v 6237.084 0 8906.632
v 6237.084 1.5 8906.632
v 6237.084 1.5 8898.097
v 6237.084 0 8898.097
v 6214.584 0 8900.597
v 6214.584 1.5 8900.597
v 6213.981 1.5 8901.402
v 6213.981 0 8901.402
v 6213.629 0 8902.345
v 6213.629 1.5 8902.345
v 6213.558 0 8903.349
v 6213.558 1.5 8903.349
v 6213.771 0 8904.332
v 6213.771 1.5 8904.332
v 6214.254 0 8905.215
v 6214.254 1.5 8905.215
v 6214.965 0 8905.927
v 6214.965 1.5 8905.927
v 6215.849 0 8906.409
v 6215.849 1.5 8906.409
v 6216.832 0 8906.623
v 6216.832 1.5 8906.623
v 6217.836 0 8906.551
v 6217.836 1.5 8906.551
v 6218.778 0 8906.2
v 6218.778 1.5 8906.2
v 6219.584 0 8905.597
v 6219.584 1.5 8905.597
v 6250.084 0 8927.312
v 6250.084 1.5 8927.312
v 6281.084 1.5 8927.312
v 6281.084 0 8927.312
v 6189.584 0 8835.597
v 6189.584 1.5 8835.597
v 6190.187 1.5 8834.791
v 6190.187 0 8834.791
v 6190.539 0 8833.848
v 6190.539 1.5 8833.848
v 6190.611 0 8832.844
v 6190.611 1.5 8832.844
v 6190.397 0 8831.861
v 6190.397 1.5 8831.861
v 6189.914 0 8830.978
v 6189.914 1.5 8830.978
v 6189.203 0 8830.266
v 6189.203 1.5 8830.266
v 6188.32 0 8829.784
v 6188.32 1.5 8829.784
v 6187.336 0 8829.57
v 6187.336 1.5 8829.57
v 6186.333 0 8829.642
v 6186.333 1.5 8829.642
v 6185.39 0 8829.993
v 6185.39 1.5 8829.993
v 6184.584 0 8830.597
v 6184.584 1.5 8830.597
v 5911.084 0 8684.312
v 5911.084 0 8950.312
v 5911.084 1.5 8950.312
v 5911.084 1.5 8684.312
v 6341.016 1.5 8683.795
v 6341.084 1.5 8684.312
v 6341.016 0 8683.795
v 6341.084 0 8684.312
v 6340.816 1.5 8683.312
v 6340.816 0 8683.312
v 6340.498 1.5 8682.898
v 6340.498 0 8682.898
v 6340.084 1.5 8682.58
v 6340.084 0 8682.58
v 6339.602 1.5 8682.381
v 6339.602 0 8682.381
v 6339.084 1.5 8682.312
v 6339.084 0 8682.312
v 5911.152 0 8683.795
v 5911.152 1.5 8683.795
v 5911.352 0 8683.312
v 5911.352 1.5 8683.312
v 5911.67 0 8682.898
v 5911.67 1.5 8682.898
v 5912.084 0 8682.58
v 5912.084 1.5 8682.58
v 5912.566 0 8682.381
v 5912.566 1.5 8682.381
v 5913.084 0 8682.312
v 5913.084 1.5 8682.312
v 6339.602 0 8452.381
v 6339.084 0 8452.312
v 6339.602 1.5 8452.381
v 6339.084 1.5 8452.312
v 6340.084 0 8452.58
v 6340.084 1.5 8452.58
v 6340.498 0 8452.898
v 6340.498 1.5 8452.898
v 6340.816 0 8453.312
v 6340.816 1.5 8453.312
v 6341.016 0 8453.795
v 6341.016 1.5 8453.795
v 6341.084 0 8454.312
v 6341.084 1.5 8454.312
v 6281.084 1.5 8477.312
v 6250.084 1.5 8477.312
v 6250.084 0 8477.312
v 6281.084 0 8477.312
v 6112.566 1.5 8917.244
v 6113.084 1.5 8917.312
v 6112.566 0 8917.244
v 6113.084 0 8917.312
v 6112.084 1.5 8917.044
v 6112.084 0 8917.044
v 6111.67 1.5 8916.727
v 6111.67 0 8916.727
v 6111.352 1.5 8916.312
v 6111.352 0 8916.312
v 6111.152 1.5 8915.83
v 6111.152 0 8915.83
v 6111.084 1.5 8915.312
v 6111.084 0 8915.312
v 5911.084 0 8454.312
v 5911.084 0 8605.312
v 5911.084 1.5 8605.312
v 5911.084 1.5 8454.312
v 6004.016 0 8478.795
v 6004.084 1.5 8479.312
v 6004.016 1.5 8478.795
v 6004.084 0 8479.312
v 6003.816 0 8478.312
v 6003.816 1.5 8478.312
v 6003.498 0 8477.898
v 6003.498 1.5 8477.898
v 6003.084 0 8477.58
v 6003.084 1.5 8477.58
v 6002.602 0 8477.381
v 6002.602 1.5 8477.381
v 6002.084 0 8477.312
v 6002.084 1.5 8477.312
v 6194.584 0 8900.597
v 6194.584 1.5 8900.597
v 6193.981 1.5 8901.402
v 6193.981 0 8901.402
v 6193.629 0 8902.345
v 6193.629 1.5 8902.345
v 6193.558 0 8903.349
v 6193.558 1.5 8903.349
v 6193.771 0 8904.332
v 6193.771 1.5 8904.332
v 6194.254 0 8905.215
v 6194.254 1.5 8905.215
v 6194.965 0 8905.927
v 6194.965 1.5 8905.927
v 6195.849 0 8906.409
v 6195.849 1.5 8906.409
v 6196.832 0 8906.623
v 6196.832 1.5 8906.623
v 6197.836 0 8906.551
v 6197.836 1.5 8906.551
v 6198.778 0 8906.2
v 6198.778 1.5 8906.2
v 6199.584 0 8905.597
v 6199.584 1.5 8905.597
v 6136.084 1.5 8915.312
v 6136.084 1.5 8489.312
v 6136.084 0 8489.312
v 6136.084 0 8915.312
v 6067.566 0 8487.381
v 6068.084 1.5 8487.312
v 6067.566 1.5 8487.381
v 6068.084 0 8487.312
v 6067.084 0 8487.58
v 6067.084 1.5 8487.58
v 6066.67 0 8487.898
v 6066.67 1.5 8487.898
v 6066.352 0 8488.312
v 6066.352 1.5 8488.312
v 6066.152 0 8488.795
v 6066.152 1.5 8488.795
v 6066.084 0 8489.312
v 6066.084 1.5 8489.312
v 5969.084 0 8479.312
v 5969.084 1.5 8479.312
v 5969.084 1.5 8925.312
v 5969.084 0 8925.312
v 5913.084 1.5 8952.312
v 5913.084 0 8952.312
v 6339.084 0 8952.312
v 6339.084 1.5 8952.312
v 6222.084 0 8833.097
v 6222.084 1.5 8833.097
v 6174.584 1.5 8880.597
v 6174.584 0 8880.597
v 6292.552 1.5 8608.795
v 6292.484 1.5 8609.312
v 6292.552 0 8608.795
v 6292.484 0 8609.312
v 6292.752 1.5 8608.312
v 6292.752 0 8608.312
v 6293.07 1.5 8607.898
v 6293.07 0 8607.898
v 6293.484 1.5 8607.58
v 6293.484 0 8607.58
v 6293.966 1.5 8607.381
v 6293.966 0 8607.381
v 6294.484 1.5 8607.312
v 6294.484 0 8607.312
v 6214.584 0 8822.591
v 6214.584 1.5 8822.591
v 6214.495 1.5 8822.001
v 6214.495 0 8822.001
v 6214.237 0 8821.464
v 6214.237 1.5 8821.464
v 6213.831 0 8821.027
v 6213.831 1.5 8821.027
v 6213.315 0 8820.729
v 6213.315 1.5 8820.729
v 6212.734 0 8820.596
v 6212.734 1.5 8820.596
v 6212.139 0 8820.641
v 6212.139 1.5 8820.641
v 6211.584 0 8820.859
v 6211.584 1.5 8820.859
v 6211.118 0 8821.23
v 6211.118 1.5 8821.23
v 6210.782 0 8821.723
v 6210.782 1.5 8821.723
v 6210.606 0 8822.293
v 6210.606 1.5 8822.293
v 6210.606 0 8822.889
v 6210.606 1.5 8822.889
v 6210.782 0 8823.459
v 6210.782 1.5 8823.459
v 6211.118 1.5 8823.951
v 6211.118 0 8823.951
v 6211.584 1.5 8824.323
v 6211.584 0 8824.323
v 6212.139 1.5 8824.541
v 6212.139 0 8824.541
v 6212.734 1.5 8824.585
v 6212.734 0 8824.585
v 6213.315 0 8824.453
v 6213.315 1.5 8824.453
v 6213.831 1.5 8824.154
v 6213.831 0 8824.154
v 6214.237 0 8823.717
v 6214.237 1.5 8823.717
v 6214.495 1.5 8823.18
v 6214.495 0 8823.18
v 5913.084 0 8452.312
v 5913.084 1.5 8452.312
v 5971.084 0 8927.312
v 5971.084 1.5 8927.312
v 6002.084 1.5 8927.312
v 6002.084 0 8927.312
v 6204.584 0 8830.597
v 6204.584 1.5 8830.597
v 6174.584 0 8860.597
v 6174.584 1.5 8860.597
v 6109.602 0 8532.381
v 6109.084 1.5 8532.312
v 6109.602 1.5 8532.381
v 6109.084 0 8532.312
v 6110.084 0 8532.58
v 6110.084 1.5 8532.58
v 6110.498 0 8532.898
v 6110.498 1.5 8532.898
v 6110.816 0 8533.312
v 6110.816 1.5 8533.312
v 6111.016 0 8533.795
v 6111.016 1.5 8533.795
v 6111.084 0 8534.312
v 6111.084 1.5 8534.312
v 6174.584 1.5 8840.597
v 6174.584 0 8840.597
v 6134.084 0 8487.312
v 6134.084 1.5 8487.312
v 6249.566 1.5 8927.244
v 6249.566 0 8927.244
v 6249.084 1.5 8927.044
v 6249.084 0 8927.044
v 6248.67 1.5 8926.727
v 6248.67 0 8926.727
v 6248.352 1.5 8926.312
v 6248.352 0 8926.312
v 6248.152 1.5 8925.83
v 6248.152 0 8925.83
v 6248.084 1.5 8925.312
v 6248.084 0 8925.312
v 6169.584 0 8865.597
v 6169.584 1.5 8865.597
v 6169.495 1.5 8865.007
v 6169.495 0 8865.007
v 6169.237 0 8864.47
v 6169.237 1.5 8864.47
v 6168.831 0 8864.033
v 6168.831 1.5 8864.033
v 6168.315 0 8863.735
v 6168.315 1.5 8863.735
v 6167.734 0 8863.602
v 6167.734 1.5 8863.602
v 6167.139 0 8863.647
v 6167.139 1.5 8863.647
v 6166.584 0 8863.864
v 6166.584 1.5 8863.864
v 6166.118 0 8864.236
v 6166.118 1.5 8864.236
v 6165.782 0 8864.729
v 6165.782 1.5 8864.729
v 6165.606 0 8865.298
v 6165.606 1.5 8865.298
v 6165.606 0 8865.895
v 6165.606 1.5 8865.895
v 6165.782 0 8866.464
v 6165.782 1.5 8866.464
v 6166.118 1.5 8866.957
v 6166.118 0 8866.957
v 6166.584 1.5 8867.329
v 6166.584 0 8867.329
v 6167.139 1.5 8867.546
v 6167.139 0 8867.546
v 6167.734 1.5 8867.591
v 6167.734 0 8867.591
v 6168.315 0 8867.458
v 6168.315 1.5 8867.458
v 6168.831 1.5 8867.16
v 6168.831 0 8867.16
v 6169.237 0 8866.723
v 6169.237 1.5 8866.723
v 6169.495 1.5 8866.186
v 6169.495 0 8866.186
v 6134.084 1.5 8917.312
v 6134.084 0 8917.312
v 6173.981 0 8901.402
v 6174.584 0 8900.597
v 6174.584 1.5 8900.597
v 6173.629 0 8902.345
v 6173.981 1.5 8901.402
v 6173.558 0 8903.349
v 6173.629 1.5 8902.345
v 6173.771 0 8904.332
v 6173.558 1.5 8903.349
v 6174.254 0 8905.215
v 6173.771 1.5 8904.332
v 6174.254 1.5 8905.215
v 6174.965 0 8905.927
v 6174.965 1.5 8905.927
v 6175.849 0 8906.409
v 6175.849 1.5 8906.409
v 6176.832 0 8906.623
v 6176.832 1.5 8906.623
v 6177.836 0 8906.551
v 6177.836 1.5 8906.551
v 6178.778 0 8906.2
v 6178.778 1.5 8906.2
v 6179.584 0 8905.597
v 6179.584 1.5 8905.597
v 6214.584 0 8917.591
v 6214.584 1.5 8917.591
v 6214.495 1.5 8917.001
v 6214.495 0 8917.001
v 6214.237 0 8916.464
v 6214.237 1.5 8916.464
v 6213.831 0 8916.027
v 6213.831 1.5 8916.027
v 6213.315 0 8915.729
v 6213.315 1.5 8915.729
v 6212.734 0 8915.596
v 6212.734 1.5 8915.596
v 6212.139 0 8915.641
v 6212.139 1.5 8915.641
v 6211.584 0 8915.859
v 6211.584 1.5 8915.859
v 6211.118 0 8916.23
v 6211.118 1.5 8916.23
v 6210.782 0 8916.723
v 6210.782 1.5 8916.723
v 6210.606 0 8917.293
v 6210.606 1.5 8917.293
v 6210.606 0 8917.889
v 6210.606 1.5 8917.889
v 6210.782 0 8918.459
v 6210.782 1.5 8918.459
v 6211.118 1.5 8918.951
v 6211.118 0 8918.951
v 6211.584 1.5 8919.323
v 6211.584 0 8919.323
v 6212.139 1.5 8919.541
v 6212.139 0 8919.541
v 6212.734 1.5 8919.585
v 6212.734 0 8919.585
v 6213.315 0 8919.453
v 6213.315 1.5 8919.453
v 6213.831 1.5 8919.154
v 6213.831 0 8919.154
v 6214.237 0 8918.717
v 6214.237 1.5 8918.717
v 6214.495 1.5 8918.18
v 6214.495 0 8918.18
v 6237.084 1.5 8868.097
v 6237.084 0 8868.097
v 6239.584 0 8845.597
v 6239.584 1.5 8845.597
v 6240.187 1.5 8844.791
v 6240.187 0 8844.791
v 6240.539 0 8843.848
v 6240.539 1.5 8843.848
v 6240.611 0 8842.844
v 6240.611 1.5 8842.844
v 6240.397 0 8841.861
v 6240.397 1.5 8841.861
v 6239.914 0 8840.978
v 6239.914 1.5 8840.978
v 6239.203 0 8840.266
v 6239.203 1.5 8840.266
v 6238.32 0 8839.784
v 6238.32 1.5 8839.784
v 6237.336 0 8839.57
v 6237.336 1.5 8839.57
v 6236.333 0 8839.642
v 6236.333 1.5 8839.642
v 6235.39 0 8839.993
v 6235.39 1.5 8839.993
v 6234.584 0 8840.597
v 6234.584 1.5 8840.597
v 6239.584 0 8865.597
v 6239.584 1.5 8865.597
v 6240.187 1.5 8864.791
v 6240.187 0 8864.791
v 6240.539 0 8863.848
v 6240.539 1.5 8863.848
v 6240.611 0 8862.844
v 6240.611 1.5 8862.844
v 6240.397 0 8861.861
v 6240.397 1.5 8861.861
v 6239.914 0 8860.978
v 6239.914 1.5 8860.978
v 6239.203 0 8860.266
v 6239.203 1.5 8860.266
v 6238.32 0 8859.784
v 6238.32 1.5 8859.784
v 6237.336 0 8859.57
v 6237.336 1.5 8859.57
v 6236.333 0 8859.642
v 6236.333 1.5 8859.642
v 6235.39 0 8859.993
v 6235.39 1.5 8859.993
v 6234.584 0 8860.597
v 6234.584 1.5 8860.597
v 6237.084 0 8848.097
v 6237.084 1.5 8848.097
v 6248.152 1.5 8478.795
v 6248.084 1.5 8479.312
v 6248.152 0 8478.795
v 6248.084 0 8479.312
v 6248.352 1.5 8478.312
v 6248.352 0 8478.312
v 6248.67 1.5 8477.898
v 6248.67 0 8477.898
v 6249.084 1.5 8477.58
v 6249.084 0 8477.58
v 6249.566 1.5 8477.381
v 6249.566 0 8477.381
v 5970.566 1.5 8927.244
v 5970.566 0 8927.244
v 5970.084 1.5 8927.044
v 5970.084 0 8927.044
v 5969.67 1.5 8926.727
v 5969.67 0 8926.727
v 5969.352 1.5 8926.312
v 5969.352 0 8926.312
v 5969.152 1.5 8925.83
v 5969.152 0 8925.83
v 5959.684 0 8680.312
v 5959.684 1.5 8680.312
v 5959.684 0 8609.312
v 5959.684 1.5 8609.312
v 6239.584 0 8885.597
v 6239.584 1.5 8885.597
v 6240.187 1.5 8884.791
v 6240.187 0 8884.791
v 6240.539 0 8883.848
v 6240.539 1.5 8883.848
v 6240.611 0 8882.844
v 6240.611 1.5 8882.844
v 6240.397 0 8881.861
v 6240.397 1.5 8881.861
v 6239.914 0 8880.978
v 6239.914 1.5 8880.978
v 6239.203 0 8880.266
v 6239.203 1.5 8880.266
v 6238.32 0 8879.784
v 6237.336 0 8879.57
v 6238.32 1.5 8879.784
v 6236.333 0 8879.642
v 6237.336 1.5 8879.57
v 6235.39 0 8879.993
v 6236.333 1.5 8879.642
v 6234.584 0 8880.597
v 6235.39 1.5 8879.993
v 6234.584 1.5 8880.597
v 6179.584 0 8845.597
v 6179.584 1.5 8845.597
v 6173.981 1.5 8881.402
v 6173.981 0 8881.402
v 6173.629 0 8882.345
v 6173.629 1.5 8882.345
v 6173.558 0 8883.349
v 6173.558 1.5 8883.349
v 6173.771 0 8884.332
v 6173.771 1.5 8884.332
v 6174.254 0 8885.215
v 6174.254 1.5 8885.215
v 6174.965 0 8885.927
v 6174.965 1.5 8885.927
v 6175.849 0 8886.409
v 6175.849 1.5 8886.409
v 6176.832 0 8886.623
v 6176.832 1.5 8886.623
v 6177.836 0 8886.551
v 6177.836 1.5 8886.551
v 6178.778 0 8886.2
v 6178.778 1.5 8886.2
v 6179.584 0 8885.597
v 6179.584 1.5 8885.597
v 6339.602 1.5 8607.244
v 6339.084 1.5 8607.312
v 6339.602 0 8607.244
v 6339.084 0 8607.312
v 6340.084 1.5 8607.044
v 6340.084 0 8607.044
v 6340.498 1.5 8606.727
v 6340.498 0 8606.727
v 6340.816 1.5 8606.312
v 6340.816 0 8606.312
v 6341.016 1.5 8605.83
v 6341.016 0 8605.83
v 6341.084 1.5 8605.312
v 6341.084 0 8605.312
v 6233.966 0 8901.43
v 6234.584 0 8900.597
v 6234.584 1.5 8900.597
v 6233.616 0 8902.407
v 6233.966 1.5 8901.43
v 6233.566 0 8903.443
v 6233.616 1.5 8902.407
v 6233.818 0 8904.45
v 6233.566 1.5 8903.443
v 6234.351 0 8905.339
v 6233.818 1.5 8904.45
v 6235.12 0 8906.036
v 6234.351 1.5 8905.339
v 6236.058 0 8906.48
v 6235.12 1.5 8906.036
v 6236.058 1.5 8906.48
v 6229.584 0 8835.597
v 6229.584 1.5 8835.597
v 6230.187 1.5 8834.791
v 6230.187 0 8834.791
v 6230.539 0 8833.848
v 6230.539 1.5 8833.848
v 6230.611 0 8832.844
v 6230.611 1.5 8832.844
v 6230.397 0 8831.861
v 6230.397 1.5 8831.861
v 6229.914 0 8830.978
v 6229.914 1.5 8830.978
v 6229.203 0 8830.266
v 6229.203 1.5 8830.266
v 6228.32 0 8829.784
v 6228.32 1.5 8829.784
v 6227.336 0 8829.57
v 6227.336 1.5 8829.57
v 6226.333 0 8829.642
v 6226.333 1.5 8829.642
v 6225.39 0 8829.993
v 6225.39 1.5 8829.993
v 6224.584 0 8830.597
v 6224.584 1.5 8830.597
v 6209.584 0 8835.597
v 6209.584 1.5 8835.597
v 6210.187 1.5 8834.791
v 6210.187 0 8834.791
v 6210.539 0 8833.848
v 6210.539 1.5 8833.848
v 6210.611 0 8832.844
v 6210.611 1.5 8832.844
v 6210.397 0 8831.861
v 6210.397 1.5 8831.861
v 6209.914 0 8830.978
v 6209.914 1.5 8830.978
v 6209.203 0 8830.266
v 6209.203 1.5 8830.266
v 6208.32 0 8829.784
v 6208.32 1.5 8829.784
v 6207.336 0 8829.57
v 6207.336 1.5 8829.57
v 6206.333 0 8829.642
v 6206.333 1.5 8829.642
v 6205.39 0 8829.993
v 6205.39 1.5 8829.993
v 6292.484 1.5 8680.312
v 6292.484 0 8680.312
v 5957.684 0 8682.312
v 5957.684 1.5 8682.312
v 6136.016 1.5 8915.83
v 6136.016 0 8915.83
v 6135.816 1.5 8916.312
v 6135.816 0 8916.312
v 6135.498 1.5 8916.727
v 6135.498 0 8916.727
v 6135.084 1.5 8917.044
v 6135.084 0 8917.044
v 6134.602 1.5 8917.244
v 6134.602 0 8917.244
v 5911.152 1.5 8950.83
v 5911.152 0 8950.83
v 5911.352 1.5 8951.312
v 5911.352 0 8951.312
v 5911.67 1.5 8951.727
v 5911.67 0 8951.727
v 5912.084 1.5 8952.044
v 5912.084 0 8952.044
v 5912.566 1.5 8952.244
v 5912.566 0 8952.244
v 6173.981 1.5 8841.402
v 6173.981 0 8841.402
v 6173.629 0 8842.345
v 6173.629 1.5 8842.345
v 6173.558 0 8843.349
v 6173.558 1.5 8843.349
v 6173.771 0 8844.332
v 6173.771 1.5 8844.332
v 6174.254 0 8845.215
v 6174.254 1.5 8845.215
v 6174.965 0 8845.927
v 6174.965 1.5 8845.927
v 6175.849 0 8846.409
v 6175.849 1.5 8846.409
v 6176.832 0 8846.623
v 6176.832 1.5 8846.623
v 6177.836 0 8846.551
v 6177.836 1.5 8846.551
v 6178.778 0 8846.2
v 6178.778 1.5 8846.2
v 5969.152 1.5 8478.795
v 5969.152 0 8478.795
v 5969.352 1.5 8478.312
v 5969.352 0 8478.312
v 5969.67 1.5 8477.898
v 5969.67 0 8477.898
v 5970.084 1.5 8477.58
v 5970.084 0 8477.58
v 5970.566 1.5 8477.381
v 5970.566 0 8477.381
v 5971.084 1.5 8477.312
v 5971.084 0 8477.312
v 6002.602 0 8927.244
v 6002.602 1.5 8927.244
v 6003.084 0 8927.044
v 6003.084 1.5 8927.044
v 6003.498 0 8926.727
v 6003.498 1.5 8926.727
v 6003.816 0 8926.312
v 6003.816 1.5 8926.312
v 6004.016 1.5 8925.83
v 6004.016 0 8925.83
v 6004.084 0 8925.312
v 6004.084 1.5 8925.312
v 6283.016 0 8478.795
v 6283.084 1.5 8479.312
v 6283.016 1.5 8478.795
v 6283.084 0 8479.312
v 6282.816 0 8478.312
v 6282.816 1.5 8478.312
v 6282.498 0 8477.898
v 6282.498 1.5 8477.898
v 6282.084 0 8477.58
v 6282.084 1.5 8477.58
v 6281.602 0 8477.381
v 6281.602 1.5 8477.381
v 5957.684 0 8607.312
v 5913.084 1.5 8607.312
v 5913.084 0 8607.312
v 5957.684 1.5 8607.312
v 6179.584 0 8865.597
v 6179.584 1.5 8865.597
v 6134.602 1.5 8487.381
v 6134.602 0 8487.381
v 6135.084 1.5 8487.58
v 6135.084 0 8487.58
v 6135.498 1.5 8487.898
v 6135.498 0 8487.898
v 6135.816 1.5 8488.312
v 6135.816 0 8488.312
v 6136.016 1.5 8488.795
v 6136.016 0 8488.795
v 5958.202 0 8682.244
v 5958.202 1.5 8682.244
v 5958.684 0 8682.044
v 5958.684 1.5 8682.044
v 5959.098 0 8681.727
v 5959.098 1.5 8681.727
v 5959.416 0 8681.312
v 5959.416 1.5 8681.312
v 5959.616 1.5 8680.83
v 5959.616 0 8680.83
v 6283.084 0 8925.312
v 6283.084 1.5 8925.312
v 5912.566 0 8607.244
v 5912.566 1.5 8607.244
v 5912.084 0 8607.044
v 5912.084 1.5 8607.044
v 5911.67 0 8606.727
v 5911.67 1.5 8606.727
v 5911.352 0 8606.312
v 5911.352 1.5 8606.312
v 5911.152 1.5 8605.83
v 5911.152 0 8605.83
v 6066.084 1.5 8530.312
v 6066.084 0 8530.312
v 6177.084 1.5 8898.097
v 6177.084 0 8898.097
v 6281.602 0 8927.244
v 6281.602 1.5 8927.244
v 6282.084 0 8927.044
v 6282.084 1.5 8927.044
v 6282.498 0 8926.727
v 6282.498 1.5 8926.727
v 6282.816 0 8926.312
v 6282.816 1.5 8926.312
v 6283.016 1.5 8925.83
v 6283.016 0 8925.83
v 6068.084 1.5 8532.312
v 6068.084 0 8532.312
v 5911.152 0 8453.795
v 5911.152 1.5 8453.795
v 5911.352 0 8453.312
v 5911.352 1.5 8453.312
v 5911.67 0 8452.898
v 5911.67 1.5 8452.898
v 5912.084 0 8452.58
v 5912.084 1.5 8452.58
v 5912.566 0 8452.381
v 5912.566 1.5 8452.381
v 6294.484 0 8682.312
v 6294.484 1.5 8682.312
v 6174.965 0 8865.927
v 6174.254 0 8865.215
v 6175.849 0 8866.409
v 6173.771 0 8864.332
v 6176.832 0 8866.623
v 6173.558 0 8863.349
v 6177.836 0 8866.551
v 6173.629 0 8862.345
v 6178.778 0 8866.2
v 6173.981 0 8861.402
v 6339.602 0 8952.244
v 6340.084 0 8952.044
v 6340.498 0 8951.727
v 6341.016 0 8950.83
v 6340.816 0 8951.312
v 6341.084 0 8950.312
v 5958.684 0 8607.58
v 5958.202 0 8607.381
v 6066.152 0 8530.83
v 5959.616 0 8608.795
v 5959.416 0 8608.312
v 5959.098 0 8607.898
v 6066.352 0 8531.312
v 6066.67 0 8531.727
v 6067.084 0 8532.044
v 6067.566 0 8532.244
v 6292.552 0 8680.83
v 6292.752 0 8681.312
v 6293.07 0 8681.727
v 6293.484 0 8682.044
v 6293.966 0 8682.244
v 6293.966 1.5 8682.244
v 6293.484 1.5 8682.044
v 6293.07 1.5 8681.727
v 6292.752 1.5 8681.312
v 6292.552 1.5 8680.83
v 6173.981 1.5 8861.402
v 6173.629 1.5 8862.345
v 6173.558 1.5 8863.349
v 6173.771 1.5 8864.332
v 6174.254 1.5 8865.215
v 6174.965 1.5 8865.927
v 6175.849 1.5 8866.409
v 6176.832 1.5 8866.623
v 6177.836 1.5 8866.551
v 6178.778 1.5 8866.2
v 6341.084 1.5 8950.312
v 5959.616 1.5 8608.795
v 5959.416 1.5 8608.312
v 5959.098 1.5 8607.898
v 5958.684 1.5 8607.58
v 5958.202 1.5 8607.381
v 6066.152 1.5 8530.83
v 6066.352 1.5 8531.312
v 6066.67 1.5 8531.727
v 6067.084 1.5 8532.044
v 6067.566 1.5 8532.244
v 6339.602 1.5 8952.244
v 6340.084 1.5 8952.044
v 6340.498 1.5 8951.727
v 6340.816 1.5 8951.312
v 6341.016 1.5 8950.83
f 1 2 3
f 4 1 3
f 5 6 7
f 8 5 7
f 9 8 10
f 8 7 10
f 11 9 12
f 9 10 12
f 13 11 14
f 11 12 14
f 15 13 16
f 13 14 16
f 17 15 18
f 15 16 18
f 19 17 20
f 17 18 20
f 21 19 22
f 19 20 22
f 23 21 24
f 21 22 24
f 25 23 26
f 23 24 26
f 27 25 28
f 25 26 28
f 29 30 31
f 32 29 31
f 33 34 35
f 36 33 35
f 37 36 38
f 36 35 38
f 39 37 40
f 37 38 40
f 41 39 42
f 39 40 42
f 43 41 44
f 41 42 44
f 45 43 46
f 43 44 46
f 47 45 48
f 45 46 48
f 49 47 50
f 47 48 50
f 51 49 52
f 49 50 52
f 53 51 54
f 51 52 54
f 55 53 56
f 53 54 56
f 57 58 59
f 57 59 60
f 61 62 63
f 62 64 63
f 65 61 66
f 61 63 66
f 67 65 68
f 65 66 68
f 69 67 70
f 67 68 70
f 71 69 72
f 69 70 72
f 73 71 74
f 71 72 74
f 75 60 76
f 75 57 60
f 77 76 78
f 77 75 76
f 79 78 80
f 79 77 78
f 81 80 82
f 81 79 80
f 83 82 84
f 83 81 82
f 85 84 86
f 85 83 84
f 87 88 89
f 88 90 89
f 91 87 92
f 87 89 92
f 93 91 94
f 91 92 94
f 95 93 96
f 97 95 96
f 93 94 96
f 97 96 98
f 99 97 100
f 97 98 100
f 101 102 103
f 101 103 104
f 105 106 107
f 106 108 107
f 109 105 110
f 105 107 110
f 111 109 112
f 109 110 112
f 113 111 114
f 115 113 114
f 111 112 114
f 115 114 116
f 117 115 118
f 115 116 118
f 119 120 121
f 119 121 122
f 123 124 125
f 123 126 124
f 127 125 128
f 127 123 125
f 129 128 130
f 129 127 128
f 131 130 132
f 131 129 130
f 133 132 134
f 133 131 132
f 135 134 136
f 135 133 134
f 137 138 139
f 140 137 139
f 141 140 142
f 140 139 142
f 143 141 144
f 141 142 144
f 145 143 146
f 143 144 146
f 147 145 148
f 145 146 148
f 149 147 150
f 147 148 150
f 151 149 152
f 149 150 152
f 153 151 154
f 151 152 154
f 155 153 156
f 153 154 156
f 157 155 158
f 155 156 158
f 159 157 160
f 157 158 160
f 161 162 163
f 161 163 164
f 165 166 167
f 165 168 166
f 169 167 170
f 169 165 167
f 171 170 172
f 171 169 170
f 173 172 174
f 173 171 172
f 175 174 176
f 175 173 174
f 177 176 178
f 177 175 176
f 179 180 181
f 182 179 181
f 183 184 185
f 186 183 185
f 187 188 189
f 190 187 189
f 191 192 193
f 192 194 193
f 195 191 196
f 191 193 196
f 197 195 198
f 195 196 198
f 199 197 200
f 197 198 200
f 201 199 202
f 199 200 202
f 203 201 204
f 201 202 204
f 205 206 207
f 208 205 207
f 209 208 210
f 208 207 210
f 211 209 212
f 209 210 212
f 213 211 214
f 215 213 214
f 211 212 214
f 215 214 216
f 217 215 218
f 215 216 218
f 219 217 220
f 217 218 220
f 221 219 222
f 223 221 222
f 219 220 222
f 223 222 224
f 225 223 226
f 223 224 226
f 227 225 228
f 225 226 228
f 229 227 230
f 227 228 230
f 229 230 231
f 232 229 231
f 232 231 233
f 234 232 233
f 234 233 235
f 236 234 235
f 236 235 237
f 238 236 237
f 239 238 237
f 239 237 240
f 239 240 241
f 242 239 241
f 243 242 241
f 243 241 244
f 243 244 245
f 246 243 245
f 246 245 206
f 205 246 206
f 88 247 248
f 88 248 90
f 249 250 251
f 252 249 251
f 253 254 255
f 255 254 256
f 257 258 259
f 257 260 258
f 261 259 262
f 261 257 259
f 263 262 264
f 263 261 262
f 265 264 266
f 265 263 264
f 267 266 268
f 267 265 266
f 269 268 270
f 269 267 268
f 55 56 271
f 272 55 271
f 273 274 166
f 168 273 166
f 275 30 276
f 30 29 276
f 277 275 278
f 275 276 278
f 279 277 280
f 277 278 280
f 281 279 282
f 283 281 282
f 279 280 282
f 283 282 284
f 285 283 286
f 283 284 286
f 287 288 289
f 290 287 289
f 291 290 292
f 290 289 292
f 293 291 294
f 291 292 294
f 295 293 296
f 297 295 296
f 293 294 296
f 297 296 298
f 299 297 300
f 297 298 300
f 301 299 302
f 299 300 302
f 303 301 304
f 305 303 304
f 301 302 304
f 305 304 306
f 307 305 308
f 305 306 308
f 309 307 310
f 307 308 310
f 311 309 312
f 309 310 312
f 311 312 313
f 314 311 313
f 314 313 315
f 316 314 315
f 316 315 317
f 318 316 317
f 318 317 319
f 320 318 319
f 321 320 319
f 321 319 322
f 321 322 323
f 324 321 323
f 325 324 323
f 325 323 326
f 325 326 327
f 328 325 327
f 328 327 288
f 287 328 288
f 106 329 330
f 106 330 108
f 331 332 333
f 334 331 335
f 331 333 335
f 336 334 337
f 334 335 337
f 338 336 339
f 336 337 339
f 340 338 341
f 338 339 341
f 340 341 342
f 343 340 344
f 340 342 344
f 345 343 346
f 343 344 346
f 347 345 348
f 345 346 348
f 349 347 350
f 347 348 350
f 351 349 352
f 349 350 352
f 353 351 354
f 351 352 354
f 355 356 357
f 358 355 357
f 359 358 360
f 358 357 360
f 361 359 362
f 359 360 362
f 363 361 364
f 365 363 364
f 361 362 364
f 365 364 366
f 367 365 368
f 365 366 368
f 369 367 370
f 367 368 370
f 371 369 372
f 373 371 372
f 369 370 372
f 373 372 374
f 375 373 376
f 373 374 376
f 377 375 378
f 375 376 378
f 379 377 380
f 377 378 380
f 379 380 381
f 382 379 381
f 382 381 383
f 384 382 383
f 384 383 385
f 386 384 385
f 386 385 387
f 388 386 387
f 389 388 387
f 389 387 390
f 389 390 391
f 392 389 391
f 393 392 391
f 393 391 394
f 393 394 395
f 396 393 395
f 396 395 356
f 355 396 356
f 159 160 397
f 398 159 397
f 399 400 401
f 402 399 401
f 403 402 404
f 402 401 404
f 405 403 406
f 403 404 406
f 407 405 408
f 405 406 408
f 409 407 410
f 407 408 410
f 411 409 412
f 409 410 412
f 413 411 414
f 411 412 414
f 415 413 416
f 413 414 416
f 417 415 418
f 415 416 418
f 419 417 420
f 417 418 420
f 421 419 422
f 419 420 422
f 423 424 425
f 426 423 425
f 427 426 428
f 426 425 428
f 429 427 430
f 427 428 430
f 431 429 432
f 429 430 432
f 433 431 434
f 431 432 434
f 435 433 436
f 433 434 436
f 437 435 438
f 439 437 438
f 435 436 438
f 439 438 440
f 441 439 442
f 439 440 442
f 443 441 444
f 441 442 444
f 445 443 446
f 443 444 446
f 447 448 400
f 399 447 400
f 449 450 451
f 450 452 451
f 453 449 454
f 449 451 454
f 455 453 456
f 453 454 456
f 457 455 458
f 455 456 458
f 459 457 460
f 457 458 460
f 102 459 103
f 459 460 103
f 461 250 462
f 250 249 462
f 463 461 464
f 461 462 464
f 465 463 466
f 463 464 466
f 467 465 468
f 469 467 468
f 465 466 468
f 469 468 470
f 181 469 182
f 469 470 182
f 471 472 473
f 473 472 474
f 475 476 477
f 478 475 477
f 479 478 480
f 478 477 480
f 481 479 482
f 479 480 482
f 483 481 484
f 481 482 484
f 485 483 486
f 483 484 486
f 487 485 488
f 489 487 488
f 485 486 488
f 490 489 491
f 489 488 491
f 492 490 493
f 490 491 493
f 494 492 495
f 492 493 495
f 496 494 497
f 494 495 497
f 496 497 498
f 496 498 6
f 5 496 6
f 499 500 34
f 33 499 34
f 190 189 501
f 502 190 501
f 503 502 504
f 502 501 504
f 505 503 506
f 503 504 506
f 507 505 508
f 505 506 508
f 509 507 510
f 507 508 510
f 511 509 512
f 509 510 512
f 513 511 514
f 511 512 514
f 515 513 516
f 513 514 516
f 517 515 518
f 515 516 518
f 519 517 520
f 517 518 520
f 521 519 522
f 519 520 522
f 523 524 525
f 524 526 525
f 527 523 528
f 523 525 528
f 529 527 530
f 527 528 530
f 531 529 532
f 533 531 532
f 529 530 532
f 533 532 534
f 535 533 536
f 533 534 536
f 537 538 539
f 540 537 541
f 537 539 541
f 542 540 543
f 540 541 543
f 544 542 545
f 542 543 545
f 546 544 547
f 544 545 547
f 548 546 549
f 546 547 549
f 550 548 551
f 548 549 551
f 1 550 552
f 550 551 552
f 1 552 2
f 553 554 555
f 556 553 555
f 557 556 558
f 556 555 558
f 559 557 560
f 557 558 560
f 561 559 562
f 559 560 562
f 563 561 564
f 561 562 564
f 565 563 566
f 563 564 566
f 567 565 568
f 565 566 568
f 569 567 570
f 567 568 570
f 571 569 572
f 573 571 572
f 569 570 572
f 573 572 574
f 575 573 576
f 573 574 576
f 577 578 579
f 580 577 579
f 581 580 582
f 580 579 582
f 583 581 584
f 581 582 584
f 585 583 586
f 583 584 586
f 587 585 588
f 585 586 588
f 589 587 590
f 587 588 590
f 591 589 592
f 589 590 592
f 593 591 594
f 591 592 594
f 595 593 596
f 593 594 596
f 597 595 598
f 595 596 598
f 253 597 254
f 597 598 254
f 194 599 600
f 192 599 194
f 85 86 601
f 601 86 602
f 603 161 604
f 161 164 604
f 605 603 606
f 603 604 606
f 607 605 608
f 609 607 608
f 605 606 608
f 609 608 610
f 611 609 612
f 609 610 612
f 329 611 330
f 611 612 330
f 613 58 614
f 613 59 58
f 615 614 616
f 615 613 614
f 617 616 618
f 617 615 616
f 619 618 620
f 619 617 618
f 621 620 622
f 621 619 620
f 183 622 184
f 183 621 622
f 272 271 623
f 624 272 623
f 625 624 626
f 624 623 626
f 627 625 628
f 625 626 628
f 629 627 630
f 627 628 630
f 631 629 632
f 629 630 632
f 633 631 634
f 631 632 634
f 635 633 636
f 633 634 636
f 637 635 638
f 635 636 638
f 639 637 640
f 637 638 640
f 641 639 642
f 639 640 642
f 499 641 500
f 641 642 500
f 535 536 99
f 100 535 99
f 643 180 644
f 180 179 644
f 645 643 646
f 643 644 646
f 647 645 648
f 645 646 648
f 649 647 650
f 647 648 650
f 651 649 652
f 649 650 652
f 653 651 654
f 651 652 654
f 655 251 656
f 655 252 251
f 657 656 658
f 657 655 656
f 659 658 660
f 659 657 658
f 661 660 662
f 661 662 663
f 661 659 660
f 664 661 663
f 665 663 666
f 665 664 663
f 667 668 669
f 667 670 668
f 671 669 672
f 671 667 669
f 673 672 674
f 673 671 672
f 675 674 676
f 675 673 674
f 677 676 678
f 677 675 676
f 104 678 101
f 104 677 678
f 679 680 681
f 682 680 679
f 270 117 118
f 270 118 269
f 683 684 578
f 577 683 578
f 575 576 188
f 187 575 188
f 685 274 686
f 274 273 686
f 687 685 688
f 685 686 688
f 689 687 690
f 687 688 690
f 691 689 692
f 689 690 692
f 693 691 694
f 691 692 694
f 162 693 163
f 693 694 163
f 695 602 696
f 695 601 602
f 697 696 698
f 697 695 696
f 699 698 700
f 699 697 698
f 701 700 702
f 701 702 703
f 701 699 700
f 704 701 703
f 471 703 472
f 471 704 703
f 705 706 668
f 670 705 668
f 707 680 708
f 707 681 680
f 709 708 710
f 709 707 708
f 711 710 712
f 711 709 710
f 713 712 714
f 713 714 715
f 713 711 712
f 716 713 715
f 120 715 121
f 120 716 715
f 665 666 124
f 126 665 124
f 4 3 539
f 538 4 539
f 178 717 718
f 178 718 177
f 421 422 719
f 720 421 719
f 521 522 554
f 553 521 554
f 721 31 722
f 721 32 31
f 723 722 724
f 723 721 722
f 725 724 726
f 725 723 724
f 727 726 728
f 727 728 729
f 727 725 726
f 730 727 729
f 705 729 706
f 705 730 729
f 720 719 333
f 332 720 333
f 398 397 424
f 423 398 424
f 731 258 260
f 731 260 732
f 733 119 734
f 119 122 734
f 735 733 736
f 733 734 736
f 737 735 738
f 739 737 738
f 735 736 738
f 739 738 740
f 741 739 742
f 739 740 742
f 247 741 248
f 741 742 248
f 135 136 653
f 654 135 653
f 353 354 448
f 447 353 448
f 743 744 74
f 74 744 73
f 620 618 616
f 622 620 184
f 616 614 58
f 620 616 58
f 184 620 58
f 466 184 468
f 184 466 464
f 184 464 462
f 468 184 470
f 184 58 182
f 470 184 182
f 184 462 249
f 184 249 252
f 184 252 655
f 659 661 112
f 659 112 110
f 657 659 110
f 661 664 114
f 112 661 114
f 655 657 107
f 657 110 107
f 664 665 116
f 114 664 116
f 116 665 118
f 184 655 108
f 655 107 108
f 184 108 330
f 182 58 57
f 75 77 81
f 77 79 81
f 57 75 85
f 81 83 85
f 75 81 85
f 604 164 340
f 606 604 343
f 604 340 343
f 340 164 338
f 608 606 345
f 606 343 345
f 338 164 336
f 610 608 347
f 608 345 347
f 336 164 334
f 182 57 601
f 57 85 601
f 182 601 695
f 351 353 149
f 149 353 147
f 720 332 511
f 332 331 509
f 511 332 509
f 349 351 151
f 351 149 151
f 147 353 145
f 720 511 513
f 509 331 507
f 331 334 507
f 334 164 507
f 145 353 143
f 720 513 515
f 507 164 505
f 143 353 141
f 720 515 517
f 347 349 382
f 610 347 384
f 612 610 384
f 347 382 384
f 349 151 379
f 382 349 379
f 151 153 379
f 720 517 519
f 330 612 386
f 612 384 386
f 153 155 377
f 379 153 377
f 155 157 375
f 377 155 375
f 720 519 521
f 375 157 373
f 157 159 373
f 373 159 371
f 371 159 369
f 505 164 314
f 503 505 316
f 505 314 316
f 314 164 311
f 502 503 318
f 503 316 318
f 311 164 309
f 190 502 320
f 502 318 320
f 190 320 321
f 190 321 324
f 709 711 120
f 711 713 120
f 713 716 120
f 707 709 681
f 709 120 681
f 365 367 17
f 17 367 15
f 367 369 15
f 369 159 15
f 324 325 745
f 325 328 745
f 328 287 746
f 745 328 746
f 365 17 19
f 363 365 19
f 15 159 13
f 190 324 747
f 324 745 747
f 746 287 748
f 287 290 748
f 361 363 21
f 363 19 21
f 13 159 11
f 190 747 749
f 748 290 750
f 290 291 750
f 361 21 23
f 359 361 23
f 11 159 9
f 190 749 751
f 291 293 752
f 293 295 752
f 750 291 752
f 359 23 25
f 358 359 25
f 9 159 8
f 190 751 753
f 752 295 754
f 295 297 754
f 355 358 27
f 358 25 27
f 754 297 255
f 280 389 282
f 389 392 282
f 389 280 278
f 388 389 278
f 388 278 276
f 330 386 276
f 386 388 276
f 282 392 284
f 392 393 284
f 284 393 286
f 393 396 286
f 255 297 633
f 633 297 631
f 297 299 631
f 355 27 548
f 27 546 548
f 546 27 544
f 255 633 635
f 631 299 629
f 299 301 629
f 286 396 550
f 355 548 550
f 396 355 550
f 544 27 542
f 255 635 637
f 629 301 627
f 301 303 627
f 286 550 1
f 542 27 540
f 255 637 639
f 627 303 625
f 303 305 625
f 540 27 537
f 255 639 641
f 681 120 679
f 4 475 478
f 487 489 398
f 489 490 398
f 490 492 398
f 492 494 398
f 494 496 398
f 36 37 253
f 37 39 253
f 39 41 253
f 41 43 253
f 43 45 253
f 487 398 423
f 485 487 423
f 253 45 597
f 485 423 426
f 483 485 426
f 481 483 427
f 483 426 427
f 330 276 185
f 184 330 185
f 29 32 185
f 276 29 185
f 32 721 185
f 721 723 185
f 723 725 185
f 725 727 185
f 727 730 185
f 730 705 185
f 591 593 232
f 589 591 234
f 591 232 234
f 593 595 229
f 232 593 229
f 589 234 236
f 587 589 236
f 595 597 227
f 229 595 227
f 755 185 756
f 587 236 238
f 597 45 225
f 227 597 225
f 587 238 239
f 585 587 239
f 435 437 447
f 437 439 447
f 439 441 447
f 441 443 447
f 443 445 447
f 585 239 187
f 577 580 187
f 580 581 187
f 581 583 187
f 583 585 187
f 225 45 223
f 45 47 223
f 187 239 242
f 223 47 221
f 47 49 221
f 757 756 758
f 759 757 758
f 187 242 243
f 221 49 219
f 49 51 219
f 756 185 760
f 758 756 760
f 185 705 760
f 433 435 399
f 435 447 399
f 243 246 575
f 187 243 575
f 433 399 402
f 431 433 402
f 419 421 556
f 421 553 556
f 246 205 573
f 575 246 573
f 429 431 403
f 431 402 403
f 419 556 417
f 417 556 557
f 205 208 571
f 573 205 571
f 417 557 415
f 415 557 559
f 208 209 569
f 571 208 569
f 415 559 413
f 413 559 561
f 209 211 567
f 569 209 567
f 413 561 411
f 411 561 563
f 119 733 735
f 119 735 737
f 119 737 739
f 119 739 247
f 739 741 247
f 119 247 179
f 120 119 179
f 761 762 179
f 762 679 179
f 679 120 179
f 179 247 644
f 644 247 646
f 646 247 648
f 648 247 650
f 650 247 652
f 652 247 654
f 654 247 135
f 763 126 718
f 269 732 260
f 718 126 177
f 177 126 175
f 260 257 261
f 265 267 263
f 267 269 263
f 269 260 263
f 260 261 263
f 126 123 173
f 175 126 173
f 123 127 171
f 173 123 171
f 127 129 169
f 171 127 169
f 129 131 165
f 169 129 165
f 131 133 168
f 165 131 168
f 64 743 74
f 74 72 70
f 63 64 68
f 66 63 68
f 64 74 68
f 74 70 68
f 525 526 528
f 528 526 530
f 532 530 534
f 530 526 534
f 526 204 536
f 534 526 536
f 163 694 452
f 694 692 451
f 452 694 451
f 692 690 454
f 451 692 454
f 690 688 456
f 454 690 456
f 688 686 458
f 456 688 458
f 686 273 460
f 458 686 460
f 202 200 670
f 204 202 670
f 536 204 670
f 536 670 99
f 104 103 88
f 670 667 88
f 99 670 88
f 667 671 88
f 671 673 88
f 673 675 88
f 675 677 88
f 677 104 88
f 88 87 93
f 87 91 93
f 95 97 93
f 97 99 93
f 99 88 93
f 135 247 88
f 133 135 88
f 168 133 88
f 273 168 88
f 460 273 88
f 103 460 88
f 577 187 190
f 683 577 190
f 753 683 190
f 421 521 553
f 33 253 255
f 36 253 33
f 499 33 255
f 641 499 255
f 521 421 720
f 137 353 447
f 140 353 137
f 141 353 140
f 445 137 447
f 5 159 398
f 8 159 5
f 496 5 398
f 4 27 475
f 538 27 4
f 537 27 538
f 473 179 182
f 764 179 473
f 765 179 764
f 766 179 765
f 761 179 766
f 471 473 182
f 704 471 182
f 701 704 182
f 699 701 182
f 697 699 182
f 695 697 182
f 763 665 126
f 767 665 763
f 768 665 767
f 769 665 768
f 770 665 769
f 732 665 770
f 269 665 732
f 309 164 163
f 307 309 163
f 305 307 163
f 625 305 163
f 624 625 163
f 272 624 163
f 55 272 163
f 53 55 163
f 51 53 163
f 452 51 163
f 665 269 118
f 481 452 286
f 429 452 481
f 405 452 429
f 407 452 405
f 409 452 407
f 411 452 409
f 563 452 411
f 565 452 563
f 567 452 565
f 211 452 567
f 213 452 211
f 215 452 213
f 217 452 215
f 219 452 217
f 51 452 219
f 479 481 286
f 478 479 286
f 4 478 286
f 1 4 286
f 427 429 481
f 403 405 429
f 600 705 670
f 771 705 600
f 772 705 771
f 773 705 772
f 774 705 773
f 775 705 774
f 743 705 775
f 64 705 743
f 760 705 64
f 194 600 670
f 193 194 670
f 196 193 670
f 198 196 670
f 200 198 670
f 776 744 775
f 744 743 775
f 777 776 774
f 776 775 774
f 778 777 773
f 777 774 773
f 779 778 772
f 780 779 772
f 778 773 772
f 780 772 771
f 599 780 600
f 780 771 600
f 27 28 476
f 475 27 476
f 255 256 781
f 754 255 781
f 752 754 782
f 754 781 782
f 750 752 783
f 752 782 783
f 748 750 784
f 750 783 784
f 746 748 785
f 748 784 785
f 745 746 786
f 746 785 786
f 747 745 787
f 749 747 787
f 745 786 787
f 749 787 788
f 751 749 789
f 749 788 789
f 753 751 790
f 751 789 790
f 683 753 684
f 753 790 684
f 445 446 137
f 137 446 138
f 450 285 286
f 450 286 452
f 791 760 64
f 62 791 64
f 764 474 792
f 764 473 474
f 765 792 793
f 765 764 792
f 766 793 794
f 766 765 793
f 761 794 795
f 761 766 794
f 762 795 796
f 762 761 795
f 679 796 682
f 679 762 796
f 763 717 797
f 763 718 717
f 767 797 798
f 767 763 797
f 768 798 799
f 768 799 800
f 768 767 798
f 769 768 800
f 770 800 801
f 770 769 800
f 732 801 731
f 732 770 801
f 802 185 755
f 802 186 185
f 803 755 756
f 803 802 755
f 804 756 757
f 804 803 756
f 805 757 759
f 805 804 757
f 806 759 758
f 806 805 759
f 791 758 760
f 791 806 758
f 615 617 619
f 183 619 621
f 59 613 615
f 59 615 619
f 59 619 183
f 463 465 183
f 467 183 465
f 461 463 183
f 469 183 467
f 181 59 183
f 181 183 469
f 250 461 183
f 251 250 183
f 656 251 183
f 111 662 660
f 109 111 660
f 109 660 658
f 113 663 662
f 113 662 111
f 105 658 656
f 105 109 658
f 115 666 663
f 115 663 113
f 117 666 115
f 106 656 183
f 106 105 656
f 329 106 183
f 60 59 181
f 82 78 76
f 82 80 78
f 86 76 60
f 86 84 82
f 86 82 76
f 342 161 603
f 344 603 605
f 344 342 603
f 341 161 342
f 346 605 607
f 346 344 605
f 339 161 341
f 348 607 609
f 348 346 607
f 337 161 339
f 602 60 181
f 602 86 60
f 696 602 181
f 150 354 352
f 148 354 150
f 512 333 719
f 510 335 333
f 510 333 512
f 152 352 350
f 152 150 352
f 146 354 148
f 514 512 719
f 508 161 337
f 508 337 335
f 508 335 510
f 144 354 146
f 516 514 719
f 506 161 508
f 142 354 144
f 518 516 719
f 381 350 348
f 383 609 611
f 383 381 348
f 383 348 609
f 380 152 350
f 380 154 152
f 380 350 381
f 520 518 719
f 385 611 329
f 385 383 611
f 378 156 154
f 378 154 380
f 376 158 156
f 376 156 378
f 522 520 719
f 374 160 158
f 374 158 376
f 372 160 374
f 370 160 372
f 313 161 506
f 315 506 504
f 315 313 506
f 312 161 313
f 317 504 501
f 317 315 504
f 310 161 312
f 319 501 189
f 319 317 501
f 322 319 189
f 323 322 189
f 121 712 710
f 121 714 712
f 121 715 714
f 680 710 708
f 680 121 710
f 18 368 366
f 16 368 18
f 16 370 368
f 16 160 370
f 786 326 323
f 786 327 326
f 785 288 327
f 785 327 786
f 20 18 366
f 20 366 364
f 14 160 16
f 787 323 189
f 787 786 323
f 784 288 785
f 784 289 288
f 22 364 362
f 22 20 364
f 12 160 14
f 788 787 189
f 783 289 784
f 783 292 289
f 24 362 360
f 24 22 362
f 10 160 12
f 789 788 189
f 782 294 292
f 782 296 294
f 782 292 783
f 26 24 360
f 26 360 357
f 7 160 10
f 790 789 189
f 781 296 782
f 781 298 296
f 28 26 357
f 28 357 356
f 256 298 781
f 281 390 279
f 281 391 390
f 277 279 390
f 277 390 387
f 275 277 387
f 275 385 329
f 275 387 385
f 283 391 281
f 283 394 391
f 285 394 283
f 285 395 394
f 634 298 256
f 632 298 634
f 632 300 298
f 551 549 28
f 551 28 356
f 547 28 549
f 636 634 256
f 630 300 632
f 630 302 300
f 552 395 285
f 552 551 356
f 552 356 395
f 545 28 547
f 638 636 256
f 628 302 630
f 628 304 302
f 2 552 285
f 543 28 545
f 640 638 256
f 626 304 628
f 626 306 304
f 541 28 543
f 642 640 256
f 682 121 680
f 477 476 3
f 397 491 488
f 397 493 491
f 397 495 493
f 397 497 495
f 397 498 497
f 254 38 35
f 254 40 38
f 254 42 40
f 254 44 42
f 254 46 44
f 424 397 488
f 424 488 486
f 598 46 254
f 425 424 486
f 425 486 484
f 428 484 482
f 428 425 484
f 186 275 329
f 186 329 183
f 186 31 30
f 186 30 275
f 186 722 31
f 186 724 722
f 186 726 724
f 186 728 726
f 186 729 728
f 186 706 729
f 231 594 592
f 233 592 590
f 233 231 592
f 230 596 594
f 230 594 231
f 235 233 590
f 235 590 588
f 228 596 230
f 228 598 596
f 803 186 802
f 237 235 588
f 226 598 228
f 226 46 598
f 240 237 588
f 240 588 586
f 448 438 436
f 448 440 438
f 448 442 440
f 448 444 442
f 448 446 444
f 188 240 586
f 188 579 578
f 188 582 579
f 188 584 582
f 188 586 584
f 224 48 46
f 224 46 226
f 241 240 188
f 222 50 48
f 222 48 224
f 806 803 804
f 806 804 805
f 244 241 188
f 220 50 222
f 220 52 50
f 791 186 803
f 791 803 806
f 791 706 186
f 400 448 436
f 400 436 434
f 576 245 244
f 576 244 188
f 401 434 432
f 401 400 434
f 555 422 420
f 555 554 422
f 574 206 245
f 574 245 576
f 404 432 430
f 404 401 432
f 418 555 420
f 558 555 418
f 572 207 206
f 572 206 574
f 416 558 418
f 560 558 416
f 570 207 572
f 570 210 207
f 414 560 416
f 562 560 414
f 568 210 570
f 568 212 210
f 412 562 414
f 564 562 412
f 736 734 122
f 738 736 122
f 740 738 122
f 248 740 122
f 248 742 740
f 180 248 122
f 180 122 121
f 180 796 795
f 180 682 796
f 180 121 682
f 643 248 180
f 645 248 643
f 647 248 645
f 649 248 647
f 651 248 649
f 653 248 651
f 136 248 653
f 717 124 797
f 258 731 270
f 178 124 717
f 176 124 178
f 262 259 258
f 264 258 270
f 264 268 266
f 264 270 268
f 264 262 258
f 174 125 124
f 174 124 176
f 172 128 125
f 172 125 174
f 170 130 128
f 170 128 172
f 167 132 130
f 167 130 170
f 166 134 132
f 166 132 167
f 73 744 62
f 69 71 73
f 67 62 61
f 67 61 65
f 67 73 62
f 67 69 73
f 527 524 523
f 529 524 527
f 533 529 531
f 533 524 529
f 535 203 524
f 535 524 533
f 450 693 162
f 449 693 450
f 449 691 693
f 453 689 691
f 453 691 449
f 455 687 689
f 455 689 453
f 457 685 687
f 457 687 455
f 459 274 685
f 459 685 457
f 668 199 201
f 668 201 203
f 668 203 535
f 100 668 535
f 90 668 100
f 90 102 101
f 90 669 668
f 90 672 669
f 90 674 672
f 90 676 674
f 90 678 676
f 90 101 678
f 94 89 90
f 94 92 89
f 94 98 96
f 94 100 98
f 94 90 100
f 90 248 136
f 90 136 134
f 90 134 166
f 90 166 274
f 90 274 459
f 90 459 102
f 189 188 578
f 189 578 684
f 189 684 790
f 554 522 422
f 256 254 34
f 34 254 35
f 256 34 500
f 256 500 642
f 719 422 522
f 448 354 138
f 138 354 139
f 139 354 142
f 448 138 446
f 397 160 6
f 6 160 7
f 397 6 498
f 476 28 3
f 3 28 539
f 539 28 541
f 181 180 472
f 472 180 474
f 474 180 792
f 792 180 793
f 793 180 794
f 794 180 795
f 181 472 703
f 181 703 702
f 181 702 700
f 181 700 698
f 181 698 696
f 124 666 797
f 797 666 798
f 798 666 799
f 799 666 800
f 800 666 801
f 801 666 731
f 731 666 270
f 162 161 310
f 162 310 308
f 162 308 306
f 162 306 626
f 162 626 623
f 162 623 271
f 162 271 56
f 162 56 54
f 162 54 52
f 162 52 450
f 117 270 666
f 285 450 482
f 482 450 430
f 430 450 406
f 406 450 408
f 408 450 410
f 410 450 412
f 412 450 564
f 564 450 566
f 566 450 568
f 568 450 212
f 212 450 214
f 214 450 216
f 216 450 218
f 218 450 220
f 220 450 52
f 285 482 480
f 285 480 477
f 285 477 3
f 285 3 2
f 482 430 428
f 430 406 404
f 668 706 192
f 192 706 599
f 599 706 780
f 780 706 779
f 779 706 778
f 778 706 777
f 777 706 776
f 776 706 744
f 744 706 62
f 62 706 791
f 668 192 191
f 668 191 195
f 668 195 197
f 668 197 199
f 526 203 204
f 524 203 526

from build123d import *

# Parameters (mm, degrees)
SKETCH1_W           = 430
SKETCH1_H           = 500
BOSS_EXTRUDE1_DEPTH = 1.5
SKETCH2_W           = 48.6
SKETCH2_H           = 75
CUT_EXTRUDE1_DEPTH  = 10
SKETCH3_W           = 35
SKETCH3_H           = 450
CUT_EXTRUDE2_DEPTH  = 10
CUT_EXTRUDE3_DEPTH  = 10
FILLET2_R           = 2
FILLET3_R           = 2
SKETCH6_R           = 2
CUT_EXTRUDE4_DEPTH  = 10


with BuildPart() as part:
    # Sketch1 → Boss-Extrude1 (new body)
    with BuildSketch(Plane(origin=(0, 0, 0), x_dir=(1, 0, 0), z_dir=(0, 1, 0))):
        with Locations((6126.084066999, -8702.312377786)):
            Rectangle(SKETCH1_W, SKETCH1_H)
    extrude(amount=BOSS_EXTRUDE1_DEPTH)

    # Sketch2 → Cut-Extrude1 (cut)
    with BuildSketch(Plane(origin=(0, 1.5, 0), x_dir=(1, 0, 0), z_dir=(0, 1, 0))):
        with Locations((5935.384066999, -8644.812377786)):
            Rectangle(SKETCH2_W, SKETCH2_H)
        with Locations((6316.784066999, -8644.812377786)):
            Rectangle(SKETCH2_W, SKETCH2_H)
    extrude(amount=-CUT_EXTRUDE1_DEPTH, mode=Mode.SUBTRACT)

    # Sketch3 → Cut-Extrude2 (cut)
    with BuildSketch(Plane(origin=(0, 1.5, 0), x_dir=(1, 0, 0), z_dir=(0, 1, 0))):
        Polygon((5969.084066999, -8541.651929061), (5969.084066999, -8927.312377786), (6004.084066999, -8927.312377786), (6004.084066999, -8477.312377786), (5969.084066999, -8477.312377786), align=None)
        with Locations((6265.584066999, -8702.312377786)):
            Rectangle(SKETCH3_W, SKETCH3_H)
        Polygon((6102.084066999, -8487.312377786), (6136.084066999, -8487.312377786), (6136.084066999, -8917.312377786), (6111.084066999, -8917.312377786), (6111.084066999, -8532.312377786), (6066.084066999, -8532.312377786), (6066.084066999, -8487.312377786), align=None)
    extrude(amount=-CUT_EXTRUDE2_DEPTH, mode=Mode.SUBTRACT)

    # Sketch4 → Cut-Extrude3 (cut)
    with BuildSketch(Plane(origin=(0, 1.5, 0), x_dir=(1, 0, 0), z_dir=(0, 1, 0))):
        with BuildLine():
            Line((6234.584067167, -8840.596520357), (6177.084066999, -8898.096518708))
            Line((6177.084066999, -8898.096518708), (6174.584066999, -8900.596520951))
            ThreePointArc((6174.584066999, -8900.596520951), (6174.584069168, -8905.596518633), (6179.584066849, -8905.596518637))
            Line((6179.584066849, -8905.596518637), (6237.084067092, -8848.09652021))
            Line((6237.084067092, -8848.09652021), (6239.584067017, -8845.596520364))
            ThreePointArc((6239.584067017, -8845.596520364), (6239.584067096, -8840.596520436), (6234.584067167, -8840.596520357))
        make_face()
        with BuildLine():
            ThreePointArc((6174.584067387, -8880.596519018), (6174.584067598, -8885.596518612), (6179.584067193, -8885.596518982))
            Line((6179.584067193, -8885.596518982), (6229.584067988, -8835.596519766))
            ThreePointArc((6229.584067988, -8835.596519766), (6229.584069287, -8830.596518949), (6224.584068469, -8830.596519802))
            Line((6224.584068469, -8830.596519802), (6222.084069197, -8833.096518708))
            Line((6222.084069197, -8833.096518708), (6174.584067387, -8880.596519018))
        make_face()
        with BuildLine():
            ThreePointArc((6174.584067774, -8860.596519406), (6174.584068372, -8865.596518614), (6179.58406758, -8865.59651937))
            Line((6179.58406758, -8865.59651937), (6209.58406806, -8835.596519838))
            ThreePointArc((6209.58406806, -8835.596519838), (6209.584069287, -8830.596518805), (6204.584068253, -8830.596519874))
            Line((6204.584068253, -8830.596519874), (6174.584067774, -8860.596519406))
        make_face()
        with BuildLine():
            Line((6219.584066911, -8905.596518637), (6239.584067017, -8885.596519163))
            ThreePointArc((6239.584067017, -8885.596519163), (6239.584067096, -8880.596519234), (6234.584067167, -8880.596519155))
            Line((6234.584067167, -8880.596519155), (6214.584067061, -8900.596518629))
            ThreePointArc((6214.584067061, -8900.596518629), (6214.584066907, -8905.596518633), (6219.584066911, -8905.596518637))
        make_face()
        with BuildLine():
            ThreePointArc((6174.584068161, -8840.596519795), (6174.584069146, -8845.596518616), (6179.584067967, -8845.596519759))
            Line((6179.584067967, -8845.596519759), (6189.584068132, -8835.59651991))
            ThreePointArc((6189.584068132, -8835.59651991), (6189.584069431, -8830.596518805), (6184.584068325, -8830.596519946))
            Line((6184.584068325, -8830.596519946), (6174.584068161, -8840.596519795))
        make_face()
        with BuildLine():
            Line((6234.584067693, -8860.59651923), (6194.58406703, -8900.596518629))
            ThreePointArc((6194.58406703, -8900.596518629), (6194.584066876, -8905.596518633), (6199.58406688, -8905.596518637))
            Line((6199.58406688, -8905.596518637), (6237.084067092, -8868.096519609))
            Line((6237.084067092, -8868.096519609), (6239.584067543, -8865.596517133))
            ThreePointArc((6239.584067543, -8865.596517133), (6239.584066044, -8860.596518783), (6234.584067693, -8860.59651923))
        make_face()
        with BuildLine():
            Line((6237.084067092, -8898.096518708), (6234.584067092, -8900.596518629))
            ThreePointArc((6234.584067092, -8900.596518629), (6233.817659407, -8904.449508447), (6237.084067092, -8906.632051027))
            Line((6237.084067092, -8906.632051027), (6237.084067092, -8898.096518708))
        make_face()
    extrude(amount=-CUT_EXTRUDE3_DEPTH, mode=Mode.SUBTRACT)

    # Fillet2
    fillet2_edges = [part.edges().sort_by_distance(p)[0] for p in [
        (5959.684066999, 0.75, 8607.312377786),
        (5959.684066999, 0.75, 8682.312377786),
        (5911.084066999, 0.75, 8682.312377786),
        (5911.084066999, 0.75, 8607.312377786),
        (6341.084066999, 0.75, 8607.312377786),
        (6341.084066999, 0.75, 8682.312377786),
        (6292.484066999, 0.75, 8682.312377786),
        (6292.484066999, 0.75, 8607.312377786),
        (5911.084066999, 0.75, 8452.312377786),
        (6341.084066999, 0.75, 8452.312377786),
        (6341.084066999, 0.75, 8952.312377786),
        (5911.084066999, 0.75, 8952.312377786),
    ]]
    fillet(fillet2_edges, radius=FILLET2_R)

    # Fillet3
    fillet3_edges = [part.edges().sort_by_distance(p)[0] for p in [
        (6283.084066999, 0.75, 8477.312377786),
        (6283.084066999, 0.75, 8927.312377786),
        (6248.084066999, 0.75, 8927.312377786),
        (6248.084066999, 0.75, 8477.312377786),
        (5969.084066999, 0.75, 8477.312377786),
        (6004.084066999, 0.75, 8477.312377786),
        (6004.084066999, 0.75, 8927.312377786),
        (5969.084066999, 0.75, 8927.312377786),
        (6066.084066999, 0.75, 8532.312377786),
        (6066.084066999, 0.75, 8487.312377786),
        (6136.084066999, 0.75, 8487.312377786),
        (6136.084066999, 0.75, 8917.312377786),
        (6111.084066999, 0.75, 8917.312377786),
        (6111.084066999, 0.75, 8532.312377786),
    ]]
    fillet(fillet3_edges, radius=FILLET3_R)

    # Sketch6 → Cut-Extrude4 (cut)
    with BuildSketch(Plane(origin=(0, 1.5, 0), x_dir=(1, 0, 0), z_dir=(0, 1, 0))):
        with Locations((6212.584066999, -8822.590833806)):
            Circle(SKETCH6_R)
        with Locations((6212.584066999, -8917.590833806)):
            Circle(SKETCH6_R)
        with Locations((6167.584066999, -8865.596518708)):
            Circle(SKETCH6_R)
    extrude(amount=-CUT_EXTRUDE4_DEPTH, mode=Mode.SUBTRACT)


solid = part.part
